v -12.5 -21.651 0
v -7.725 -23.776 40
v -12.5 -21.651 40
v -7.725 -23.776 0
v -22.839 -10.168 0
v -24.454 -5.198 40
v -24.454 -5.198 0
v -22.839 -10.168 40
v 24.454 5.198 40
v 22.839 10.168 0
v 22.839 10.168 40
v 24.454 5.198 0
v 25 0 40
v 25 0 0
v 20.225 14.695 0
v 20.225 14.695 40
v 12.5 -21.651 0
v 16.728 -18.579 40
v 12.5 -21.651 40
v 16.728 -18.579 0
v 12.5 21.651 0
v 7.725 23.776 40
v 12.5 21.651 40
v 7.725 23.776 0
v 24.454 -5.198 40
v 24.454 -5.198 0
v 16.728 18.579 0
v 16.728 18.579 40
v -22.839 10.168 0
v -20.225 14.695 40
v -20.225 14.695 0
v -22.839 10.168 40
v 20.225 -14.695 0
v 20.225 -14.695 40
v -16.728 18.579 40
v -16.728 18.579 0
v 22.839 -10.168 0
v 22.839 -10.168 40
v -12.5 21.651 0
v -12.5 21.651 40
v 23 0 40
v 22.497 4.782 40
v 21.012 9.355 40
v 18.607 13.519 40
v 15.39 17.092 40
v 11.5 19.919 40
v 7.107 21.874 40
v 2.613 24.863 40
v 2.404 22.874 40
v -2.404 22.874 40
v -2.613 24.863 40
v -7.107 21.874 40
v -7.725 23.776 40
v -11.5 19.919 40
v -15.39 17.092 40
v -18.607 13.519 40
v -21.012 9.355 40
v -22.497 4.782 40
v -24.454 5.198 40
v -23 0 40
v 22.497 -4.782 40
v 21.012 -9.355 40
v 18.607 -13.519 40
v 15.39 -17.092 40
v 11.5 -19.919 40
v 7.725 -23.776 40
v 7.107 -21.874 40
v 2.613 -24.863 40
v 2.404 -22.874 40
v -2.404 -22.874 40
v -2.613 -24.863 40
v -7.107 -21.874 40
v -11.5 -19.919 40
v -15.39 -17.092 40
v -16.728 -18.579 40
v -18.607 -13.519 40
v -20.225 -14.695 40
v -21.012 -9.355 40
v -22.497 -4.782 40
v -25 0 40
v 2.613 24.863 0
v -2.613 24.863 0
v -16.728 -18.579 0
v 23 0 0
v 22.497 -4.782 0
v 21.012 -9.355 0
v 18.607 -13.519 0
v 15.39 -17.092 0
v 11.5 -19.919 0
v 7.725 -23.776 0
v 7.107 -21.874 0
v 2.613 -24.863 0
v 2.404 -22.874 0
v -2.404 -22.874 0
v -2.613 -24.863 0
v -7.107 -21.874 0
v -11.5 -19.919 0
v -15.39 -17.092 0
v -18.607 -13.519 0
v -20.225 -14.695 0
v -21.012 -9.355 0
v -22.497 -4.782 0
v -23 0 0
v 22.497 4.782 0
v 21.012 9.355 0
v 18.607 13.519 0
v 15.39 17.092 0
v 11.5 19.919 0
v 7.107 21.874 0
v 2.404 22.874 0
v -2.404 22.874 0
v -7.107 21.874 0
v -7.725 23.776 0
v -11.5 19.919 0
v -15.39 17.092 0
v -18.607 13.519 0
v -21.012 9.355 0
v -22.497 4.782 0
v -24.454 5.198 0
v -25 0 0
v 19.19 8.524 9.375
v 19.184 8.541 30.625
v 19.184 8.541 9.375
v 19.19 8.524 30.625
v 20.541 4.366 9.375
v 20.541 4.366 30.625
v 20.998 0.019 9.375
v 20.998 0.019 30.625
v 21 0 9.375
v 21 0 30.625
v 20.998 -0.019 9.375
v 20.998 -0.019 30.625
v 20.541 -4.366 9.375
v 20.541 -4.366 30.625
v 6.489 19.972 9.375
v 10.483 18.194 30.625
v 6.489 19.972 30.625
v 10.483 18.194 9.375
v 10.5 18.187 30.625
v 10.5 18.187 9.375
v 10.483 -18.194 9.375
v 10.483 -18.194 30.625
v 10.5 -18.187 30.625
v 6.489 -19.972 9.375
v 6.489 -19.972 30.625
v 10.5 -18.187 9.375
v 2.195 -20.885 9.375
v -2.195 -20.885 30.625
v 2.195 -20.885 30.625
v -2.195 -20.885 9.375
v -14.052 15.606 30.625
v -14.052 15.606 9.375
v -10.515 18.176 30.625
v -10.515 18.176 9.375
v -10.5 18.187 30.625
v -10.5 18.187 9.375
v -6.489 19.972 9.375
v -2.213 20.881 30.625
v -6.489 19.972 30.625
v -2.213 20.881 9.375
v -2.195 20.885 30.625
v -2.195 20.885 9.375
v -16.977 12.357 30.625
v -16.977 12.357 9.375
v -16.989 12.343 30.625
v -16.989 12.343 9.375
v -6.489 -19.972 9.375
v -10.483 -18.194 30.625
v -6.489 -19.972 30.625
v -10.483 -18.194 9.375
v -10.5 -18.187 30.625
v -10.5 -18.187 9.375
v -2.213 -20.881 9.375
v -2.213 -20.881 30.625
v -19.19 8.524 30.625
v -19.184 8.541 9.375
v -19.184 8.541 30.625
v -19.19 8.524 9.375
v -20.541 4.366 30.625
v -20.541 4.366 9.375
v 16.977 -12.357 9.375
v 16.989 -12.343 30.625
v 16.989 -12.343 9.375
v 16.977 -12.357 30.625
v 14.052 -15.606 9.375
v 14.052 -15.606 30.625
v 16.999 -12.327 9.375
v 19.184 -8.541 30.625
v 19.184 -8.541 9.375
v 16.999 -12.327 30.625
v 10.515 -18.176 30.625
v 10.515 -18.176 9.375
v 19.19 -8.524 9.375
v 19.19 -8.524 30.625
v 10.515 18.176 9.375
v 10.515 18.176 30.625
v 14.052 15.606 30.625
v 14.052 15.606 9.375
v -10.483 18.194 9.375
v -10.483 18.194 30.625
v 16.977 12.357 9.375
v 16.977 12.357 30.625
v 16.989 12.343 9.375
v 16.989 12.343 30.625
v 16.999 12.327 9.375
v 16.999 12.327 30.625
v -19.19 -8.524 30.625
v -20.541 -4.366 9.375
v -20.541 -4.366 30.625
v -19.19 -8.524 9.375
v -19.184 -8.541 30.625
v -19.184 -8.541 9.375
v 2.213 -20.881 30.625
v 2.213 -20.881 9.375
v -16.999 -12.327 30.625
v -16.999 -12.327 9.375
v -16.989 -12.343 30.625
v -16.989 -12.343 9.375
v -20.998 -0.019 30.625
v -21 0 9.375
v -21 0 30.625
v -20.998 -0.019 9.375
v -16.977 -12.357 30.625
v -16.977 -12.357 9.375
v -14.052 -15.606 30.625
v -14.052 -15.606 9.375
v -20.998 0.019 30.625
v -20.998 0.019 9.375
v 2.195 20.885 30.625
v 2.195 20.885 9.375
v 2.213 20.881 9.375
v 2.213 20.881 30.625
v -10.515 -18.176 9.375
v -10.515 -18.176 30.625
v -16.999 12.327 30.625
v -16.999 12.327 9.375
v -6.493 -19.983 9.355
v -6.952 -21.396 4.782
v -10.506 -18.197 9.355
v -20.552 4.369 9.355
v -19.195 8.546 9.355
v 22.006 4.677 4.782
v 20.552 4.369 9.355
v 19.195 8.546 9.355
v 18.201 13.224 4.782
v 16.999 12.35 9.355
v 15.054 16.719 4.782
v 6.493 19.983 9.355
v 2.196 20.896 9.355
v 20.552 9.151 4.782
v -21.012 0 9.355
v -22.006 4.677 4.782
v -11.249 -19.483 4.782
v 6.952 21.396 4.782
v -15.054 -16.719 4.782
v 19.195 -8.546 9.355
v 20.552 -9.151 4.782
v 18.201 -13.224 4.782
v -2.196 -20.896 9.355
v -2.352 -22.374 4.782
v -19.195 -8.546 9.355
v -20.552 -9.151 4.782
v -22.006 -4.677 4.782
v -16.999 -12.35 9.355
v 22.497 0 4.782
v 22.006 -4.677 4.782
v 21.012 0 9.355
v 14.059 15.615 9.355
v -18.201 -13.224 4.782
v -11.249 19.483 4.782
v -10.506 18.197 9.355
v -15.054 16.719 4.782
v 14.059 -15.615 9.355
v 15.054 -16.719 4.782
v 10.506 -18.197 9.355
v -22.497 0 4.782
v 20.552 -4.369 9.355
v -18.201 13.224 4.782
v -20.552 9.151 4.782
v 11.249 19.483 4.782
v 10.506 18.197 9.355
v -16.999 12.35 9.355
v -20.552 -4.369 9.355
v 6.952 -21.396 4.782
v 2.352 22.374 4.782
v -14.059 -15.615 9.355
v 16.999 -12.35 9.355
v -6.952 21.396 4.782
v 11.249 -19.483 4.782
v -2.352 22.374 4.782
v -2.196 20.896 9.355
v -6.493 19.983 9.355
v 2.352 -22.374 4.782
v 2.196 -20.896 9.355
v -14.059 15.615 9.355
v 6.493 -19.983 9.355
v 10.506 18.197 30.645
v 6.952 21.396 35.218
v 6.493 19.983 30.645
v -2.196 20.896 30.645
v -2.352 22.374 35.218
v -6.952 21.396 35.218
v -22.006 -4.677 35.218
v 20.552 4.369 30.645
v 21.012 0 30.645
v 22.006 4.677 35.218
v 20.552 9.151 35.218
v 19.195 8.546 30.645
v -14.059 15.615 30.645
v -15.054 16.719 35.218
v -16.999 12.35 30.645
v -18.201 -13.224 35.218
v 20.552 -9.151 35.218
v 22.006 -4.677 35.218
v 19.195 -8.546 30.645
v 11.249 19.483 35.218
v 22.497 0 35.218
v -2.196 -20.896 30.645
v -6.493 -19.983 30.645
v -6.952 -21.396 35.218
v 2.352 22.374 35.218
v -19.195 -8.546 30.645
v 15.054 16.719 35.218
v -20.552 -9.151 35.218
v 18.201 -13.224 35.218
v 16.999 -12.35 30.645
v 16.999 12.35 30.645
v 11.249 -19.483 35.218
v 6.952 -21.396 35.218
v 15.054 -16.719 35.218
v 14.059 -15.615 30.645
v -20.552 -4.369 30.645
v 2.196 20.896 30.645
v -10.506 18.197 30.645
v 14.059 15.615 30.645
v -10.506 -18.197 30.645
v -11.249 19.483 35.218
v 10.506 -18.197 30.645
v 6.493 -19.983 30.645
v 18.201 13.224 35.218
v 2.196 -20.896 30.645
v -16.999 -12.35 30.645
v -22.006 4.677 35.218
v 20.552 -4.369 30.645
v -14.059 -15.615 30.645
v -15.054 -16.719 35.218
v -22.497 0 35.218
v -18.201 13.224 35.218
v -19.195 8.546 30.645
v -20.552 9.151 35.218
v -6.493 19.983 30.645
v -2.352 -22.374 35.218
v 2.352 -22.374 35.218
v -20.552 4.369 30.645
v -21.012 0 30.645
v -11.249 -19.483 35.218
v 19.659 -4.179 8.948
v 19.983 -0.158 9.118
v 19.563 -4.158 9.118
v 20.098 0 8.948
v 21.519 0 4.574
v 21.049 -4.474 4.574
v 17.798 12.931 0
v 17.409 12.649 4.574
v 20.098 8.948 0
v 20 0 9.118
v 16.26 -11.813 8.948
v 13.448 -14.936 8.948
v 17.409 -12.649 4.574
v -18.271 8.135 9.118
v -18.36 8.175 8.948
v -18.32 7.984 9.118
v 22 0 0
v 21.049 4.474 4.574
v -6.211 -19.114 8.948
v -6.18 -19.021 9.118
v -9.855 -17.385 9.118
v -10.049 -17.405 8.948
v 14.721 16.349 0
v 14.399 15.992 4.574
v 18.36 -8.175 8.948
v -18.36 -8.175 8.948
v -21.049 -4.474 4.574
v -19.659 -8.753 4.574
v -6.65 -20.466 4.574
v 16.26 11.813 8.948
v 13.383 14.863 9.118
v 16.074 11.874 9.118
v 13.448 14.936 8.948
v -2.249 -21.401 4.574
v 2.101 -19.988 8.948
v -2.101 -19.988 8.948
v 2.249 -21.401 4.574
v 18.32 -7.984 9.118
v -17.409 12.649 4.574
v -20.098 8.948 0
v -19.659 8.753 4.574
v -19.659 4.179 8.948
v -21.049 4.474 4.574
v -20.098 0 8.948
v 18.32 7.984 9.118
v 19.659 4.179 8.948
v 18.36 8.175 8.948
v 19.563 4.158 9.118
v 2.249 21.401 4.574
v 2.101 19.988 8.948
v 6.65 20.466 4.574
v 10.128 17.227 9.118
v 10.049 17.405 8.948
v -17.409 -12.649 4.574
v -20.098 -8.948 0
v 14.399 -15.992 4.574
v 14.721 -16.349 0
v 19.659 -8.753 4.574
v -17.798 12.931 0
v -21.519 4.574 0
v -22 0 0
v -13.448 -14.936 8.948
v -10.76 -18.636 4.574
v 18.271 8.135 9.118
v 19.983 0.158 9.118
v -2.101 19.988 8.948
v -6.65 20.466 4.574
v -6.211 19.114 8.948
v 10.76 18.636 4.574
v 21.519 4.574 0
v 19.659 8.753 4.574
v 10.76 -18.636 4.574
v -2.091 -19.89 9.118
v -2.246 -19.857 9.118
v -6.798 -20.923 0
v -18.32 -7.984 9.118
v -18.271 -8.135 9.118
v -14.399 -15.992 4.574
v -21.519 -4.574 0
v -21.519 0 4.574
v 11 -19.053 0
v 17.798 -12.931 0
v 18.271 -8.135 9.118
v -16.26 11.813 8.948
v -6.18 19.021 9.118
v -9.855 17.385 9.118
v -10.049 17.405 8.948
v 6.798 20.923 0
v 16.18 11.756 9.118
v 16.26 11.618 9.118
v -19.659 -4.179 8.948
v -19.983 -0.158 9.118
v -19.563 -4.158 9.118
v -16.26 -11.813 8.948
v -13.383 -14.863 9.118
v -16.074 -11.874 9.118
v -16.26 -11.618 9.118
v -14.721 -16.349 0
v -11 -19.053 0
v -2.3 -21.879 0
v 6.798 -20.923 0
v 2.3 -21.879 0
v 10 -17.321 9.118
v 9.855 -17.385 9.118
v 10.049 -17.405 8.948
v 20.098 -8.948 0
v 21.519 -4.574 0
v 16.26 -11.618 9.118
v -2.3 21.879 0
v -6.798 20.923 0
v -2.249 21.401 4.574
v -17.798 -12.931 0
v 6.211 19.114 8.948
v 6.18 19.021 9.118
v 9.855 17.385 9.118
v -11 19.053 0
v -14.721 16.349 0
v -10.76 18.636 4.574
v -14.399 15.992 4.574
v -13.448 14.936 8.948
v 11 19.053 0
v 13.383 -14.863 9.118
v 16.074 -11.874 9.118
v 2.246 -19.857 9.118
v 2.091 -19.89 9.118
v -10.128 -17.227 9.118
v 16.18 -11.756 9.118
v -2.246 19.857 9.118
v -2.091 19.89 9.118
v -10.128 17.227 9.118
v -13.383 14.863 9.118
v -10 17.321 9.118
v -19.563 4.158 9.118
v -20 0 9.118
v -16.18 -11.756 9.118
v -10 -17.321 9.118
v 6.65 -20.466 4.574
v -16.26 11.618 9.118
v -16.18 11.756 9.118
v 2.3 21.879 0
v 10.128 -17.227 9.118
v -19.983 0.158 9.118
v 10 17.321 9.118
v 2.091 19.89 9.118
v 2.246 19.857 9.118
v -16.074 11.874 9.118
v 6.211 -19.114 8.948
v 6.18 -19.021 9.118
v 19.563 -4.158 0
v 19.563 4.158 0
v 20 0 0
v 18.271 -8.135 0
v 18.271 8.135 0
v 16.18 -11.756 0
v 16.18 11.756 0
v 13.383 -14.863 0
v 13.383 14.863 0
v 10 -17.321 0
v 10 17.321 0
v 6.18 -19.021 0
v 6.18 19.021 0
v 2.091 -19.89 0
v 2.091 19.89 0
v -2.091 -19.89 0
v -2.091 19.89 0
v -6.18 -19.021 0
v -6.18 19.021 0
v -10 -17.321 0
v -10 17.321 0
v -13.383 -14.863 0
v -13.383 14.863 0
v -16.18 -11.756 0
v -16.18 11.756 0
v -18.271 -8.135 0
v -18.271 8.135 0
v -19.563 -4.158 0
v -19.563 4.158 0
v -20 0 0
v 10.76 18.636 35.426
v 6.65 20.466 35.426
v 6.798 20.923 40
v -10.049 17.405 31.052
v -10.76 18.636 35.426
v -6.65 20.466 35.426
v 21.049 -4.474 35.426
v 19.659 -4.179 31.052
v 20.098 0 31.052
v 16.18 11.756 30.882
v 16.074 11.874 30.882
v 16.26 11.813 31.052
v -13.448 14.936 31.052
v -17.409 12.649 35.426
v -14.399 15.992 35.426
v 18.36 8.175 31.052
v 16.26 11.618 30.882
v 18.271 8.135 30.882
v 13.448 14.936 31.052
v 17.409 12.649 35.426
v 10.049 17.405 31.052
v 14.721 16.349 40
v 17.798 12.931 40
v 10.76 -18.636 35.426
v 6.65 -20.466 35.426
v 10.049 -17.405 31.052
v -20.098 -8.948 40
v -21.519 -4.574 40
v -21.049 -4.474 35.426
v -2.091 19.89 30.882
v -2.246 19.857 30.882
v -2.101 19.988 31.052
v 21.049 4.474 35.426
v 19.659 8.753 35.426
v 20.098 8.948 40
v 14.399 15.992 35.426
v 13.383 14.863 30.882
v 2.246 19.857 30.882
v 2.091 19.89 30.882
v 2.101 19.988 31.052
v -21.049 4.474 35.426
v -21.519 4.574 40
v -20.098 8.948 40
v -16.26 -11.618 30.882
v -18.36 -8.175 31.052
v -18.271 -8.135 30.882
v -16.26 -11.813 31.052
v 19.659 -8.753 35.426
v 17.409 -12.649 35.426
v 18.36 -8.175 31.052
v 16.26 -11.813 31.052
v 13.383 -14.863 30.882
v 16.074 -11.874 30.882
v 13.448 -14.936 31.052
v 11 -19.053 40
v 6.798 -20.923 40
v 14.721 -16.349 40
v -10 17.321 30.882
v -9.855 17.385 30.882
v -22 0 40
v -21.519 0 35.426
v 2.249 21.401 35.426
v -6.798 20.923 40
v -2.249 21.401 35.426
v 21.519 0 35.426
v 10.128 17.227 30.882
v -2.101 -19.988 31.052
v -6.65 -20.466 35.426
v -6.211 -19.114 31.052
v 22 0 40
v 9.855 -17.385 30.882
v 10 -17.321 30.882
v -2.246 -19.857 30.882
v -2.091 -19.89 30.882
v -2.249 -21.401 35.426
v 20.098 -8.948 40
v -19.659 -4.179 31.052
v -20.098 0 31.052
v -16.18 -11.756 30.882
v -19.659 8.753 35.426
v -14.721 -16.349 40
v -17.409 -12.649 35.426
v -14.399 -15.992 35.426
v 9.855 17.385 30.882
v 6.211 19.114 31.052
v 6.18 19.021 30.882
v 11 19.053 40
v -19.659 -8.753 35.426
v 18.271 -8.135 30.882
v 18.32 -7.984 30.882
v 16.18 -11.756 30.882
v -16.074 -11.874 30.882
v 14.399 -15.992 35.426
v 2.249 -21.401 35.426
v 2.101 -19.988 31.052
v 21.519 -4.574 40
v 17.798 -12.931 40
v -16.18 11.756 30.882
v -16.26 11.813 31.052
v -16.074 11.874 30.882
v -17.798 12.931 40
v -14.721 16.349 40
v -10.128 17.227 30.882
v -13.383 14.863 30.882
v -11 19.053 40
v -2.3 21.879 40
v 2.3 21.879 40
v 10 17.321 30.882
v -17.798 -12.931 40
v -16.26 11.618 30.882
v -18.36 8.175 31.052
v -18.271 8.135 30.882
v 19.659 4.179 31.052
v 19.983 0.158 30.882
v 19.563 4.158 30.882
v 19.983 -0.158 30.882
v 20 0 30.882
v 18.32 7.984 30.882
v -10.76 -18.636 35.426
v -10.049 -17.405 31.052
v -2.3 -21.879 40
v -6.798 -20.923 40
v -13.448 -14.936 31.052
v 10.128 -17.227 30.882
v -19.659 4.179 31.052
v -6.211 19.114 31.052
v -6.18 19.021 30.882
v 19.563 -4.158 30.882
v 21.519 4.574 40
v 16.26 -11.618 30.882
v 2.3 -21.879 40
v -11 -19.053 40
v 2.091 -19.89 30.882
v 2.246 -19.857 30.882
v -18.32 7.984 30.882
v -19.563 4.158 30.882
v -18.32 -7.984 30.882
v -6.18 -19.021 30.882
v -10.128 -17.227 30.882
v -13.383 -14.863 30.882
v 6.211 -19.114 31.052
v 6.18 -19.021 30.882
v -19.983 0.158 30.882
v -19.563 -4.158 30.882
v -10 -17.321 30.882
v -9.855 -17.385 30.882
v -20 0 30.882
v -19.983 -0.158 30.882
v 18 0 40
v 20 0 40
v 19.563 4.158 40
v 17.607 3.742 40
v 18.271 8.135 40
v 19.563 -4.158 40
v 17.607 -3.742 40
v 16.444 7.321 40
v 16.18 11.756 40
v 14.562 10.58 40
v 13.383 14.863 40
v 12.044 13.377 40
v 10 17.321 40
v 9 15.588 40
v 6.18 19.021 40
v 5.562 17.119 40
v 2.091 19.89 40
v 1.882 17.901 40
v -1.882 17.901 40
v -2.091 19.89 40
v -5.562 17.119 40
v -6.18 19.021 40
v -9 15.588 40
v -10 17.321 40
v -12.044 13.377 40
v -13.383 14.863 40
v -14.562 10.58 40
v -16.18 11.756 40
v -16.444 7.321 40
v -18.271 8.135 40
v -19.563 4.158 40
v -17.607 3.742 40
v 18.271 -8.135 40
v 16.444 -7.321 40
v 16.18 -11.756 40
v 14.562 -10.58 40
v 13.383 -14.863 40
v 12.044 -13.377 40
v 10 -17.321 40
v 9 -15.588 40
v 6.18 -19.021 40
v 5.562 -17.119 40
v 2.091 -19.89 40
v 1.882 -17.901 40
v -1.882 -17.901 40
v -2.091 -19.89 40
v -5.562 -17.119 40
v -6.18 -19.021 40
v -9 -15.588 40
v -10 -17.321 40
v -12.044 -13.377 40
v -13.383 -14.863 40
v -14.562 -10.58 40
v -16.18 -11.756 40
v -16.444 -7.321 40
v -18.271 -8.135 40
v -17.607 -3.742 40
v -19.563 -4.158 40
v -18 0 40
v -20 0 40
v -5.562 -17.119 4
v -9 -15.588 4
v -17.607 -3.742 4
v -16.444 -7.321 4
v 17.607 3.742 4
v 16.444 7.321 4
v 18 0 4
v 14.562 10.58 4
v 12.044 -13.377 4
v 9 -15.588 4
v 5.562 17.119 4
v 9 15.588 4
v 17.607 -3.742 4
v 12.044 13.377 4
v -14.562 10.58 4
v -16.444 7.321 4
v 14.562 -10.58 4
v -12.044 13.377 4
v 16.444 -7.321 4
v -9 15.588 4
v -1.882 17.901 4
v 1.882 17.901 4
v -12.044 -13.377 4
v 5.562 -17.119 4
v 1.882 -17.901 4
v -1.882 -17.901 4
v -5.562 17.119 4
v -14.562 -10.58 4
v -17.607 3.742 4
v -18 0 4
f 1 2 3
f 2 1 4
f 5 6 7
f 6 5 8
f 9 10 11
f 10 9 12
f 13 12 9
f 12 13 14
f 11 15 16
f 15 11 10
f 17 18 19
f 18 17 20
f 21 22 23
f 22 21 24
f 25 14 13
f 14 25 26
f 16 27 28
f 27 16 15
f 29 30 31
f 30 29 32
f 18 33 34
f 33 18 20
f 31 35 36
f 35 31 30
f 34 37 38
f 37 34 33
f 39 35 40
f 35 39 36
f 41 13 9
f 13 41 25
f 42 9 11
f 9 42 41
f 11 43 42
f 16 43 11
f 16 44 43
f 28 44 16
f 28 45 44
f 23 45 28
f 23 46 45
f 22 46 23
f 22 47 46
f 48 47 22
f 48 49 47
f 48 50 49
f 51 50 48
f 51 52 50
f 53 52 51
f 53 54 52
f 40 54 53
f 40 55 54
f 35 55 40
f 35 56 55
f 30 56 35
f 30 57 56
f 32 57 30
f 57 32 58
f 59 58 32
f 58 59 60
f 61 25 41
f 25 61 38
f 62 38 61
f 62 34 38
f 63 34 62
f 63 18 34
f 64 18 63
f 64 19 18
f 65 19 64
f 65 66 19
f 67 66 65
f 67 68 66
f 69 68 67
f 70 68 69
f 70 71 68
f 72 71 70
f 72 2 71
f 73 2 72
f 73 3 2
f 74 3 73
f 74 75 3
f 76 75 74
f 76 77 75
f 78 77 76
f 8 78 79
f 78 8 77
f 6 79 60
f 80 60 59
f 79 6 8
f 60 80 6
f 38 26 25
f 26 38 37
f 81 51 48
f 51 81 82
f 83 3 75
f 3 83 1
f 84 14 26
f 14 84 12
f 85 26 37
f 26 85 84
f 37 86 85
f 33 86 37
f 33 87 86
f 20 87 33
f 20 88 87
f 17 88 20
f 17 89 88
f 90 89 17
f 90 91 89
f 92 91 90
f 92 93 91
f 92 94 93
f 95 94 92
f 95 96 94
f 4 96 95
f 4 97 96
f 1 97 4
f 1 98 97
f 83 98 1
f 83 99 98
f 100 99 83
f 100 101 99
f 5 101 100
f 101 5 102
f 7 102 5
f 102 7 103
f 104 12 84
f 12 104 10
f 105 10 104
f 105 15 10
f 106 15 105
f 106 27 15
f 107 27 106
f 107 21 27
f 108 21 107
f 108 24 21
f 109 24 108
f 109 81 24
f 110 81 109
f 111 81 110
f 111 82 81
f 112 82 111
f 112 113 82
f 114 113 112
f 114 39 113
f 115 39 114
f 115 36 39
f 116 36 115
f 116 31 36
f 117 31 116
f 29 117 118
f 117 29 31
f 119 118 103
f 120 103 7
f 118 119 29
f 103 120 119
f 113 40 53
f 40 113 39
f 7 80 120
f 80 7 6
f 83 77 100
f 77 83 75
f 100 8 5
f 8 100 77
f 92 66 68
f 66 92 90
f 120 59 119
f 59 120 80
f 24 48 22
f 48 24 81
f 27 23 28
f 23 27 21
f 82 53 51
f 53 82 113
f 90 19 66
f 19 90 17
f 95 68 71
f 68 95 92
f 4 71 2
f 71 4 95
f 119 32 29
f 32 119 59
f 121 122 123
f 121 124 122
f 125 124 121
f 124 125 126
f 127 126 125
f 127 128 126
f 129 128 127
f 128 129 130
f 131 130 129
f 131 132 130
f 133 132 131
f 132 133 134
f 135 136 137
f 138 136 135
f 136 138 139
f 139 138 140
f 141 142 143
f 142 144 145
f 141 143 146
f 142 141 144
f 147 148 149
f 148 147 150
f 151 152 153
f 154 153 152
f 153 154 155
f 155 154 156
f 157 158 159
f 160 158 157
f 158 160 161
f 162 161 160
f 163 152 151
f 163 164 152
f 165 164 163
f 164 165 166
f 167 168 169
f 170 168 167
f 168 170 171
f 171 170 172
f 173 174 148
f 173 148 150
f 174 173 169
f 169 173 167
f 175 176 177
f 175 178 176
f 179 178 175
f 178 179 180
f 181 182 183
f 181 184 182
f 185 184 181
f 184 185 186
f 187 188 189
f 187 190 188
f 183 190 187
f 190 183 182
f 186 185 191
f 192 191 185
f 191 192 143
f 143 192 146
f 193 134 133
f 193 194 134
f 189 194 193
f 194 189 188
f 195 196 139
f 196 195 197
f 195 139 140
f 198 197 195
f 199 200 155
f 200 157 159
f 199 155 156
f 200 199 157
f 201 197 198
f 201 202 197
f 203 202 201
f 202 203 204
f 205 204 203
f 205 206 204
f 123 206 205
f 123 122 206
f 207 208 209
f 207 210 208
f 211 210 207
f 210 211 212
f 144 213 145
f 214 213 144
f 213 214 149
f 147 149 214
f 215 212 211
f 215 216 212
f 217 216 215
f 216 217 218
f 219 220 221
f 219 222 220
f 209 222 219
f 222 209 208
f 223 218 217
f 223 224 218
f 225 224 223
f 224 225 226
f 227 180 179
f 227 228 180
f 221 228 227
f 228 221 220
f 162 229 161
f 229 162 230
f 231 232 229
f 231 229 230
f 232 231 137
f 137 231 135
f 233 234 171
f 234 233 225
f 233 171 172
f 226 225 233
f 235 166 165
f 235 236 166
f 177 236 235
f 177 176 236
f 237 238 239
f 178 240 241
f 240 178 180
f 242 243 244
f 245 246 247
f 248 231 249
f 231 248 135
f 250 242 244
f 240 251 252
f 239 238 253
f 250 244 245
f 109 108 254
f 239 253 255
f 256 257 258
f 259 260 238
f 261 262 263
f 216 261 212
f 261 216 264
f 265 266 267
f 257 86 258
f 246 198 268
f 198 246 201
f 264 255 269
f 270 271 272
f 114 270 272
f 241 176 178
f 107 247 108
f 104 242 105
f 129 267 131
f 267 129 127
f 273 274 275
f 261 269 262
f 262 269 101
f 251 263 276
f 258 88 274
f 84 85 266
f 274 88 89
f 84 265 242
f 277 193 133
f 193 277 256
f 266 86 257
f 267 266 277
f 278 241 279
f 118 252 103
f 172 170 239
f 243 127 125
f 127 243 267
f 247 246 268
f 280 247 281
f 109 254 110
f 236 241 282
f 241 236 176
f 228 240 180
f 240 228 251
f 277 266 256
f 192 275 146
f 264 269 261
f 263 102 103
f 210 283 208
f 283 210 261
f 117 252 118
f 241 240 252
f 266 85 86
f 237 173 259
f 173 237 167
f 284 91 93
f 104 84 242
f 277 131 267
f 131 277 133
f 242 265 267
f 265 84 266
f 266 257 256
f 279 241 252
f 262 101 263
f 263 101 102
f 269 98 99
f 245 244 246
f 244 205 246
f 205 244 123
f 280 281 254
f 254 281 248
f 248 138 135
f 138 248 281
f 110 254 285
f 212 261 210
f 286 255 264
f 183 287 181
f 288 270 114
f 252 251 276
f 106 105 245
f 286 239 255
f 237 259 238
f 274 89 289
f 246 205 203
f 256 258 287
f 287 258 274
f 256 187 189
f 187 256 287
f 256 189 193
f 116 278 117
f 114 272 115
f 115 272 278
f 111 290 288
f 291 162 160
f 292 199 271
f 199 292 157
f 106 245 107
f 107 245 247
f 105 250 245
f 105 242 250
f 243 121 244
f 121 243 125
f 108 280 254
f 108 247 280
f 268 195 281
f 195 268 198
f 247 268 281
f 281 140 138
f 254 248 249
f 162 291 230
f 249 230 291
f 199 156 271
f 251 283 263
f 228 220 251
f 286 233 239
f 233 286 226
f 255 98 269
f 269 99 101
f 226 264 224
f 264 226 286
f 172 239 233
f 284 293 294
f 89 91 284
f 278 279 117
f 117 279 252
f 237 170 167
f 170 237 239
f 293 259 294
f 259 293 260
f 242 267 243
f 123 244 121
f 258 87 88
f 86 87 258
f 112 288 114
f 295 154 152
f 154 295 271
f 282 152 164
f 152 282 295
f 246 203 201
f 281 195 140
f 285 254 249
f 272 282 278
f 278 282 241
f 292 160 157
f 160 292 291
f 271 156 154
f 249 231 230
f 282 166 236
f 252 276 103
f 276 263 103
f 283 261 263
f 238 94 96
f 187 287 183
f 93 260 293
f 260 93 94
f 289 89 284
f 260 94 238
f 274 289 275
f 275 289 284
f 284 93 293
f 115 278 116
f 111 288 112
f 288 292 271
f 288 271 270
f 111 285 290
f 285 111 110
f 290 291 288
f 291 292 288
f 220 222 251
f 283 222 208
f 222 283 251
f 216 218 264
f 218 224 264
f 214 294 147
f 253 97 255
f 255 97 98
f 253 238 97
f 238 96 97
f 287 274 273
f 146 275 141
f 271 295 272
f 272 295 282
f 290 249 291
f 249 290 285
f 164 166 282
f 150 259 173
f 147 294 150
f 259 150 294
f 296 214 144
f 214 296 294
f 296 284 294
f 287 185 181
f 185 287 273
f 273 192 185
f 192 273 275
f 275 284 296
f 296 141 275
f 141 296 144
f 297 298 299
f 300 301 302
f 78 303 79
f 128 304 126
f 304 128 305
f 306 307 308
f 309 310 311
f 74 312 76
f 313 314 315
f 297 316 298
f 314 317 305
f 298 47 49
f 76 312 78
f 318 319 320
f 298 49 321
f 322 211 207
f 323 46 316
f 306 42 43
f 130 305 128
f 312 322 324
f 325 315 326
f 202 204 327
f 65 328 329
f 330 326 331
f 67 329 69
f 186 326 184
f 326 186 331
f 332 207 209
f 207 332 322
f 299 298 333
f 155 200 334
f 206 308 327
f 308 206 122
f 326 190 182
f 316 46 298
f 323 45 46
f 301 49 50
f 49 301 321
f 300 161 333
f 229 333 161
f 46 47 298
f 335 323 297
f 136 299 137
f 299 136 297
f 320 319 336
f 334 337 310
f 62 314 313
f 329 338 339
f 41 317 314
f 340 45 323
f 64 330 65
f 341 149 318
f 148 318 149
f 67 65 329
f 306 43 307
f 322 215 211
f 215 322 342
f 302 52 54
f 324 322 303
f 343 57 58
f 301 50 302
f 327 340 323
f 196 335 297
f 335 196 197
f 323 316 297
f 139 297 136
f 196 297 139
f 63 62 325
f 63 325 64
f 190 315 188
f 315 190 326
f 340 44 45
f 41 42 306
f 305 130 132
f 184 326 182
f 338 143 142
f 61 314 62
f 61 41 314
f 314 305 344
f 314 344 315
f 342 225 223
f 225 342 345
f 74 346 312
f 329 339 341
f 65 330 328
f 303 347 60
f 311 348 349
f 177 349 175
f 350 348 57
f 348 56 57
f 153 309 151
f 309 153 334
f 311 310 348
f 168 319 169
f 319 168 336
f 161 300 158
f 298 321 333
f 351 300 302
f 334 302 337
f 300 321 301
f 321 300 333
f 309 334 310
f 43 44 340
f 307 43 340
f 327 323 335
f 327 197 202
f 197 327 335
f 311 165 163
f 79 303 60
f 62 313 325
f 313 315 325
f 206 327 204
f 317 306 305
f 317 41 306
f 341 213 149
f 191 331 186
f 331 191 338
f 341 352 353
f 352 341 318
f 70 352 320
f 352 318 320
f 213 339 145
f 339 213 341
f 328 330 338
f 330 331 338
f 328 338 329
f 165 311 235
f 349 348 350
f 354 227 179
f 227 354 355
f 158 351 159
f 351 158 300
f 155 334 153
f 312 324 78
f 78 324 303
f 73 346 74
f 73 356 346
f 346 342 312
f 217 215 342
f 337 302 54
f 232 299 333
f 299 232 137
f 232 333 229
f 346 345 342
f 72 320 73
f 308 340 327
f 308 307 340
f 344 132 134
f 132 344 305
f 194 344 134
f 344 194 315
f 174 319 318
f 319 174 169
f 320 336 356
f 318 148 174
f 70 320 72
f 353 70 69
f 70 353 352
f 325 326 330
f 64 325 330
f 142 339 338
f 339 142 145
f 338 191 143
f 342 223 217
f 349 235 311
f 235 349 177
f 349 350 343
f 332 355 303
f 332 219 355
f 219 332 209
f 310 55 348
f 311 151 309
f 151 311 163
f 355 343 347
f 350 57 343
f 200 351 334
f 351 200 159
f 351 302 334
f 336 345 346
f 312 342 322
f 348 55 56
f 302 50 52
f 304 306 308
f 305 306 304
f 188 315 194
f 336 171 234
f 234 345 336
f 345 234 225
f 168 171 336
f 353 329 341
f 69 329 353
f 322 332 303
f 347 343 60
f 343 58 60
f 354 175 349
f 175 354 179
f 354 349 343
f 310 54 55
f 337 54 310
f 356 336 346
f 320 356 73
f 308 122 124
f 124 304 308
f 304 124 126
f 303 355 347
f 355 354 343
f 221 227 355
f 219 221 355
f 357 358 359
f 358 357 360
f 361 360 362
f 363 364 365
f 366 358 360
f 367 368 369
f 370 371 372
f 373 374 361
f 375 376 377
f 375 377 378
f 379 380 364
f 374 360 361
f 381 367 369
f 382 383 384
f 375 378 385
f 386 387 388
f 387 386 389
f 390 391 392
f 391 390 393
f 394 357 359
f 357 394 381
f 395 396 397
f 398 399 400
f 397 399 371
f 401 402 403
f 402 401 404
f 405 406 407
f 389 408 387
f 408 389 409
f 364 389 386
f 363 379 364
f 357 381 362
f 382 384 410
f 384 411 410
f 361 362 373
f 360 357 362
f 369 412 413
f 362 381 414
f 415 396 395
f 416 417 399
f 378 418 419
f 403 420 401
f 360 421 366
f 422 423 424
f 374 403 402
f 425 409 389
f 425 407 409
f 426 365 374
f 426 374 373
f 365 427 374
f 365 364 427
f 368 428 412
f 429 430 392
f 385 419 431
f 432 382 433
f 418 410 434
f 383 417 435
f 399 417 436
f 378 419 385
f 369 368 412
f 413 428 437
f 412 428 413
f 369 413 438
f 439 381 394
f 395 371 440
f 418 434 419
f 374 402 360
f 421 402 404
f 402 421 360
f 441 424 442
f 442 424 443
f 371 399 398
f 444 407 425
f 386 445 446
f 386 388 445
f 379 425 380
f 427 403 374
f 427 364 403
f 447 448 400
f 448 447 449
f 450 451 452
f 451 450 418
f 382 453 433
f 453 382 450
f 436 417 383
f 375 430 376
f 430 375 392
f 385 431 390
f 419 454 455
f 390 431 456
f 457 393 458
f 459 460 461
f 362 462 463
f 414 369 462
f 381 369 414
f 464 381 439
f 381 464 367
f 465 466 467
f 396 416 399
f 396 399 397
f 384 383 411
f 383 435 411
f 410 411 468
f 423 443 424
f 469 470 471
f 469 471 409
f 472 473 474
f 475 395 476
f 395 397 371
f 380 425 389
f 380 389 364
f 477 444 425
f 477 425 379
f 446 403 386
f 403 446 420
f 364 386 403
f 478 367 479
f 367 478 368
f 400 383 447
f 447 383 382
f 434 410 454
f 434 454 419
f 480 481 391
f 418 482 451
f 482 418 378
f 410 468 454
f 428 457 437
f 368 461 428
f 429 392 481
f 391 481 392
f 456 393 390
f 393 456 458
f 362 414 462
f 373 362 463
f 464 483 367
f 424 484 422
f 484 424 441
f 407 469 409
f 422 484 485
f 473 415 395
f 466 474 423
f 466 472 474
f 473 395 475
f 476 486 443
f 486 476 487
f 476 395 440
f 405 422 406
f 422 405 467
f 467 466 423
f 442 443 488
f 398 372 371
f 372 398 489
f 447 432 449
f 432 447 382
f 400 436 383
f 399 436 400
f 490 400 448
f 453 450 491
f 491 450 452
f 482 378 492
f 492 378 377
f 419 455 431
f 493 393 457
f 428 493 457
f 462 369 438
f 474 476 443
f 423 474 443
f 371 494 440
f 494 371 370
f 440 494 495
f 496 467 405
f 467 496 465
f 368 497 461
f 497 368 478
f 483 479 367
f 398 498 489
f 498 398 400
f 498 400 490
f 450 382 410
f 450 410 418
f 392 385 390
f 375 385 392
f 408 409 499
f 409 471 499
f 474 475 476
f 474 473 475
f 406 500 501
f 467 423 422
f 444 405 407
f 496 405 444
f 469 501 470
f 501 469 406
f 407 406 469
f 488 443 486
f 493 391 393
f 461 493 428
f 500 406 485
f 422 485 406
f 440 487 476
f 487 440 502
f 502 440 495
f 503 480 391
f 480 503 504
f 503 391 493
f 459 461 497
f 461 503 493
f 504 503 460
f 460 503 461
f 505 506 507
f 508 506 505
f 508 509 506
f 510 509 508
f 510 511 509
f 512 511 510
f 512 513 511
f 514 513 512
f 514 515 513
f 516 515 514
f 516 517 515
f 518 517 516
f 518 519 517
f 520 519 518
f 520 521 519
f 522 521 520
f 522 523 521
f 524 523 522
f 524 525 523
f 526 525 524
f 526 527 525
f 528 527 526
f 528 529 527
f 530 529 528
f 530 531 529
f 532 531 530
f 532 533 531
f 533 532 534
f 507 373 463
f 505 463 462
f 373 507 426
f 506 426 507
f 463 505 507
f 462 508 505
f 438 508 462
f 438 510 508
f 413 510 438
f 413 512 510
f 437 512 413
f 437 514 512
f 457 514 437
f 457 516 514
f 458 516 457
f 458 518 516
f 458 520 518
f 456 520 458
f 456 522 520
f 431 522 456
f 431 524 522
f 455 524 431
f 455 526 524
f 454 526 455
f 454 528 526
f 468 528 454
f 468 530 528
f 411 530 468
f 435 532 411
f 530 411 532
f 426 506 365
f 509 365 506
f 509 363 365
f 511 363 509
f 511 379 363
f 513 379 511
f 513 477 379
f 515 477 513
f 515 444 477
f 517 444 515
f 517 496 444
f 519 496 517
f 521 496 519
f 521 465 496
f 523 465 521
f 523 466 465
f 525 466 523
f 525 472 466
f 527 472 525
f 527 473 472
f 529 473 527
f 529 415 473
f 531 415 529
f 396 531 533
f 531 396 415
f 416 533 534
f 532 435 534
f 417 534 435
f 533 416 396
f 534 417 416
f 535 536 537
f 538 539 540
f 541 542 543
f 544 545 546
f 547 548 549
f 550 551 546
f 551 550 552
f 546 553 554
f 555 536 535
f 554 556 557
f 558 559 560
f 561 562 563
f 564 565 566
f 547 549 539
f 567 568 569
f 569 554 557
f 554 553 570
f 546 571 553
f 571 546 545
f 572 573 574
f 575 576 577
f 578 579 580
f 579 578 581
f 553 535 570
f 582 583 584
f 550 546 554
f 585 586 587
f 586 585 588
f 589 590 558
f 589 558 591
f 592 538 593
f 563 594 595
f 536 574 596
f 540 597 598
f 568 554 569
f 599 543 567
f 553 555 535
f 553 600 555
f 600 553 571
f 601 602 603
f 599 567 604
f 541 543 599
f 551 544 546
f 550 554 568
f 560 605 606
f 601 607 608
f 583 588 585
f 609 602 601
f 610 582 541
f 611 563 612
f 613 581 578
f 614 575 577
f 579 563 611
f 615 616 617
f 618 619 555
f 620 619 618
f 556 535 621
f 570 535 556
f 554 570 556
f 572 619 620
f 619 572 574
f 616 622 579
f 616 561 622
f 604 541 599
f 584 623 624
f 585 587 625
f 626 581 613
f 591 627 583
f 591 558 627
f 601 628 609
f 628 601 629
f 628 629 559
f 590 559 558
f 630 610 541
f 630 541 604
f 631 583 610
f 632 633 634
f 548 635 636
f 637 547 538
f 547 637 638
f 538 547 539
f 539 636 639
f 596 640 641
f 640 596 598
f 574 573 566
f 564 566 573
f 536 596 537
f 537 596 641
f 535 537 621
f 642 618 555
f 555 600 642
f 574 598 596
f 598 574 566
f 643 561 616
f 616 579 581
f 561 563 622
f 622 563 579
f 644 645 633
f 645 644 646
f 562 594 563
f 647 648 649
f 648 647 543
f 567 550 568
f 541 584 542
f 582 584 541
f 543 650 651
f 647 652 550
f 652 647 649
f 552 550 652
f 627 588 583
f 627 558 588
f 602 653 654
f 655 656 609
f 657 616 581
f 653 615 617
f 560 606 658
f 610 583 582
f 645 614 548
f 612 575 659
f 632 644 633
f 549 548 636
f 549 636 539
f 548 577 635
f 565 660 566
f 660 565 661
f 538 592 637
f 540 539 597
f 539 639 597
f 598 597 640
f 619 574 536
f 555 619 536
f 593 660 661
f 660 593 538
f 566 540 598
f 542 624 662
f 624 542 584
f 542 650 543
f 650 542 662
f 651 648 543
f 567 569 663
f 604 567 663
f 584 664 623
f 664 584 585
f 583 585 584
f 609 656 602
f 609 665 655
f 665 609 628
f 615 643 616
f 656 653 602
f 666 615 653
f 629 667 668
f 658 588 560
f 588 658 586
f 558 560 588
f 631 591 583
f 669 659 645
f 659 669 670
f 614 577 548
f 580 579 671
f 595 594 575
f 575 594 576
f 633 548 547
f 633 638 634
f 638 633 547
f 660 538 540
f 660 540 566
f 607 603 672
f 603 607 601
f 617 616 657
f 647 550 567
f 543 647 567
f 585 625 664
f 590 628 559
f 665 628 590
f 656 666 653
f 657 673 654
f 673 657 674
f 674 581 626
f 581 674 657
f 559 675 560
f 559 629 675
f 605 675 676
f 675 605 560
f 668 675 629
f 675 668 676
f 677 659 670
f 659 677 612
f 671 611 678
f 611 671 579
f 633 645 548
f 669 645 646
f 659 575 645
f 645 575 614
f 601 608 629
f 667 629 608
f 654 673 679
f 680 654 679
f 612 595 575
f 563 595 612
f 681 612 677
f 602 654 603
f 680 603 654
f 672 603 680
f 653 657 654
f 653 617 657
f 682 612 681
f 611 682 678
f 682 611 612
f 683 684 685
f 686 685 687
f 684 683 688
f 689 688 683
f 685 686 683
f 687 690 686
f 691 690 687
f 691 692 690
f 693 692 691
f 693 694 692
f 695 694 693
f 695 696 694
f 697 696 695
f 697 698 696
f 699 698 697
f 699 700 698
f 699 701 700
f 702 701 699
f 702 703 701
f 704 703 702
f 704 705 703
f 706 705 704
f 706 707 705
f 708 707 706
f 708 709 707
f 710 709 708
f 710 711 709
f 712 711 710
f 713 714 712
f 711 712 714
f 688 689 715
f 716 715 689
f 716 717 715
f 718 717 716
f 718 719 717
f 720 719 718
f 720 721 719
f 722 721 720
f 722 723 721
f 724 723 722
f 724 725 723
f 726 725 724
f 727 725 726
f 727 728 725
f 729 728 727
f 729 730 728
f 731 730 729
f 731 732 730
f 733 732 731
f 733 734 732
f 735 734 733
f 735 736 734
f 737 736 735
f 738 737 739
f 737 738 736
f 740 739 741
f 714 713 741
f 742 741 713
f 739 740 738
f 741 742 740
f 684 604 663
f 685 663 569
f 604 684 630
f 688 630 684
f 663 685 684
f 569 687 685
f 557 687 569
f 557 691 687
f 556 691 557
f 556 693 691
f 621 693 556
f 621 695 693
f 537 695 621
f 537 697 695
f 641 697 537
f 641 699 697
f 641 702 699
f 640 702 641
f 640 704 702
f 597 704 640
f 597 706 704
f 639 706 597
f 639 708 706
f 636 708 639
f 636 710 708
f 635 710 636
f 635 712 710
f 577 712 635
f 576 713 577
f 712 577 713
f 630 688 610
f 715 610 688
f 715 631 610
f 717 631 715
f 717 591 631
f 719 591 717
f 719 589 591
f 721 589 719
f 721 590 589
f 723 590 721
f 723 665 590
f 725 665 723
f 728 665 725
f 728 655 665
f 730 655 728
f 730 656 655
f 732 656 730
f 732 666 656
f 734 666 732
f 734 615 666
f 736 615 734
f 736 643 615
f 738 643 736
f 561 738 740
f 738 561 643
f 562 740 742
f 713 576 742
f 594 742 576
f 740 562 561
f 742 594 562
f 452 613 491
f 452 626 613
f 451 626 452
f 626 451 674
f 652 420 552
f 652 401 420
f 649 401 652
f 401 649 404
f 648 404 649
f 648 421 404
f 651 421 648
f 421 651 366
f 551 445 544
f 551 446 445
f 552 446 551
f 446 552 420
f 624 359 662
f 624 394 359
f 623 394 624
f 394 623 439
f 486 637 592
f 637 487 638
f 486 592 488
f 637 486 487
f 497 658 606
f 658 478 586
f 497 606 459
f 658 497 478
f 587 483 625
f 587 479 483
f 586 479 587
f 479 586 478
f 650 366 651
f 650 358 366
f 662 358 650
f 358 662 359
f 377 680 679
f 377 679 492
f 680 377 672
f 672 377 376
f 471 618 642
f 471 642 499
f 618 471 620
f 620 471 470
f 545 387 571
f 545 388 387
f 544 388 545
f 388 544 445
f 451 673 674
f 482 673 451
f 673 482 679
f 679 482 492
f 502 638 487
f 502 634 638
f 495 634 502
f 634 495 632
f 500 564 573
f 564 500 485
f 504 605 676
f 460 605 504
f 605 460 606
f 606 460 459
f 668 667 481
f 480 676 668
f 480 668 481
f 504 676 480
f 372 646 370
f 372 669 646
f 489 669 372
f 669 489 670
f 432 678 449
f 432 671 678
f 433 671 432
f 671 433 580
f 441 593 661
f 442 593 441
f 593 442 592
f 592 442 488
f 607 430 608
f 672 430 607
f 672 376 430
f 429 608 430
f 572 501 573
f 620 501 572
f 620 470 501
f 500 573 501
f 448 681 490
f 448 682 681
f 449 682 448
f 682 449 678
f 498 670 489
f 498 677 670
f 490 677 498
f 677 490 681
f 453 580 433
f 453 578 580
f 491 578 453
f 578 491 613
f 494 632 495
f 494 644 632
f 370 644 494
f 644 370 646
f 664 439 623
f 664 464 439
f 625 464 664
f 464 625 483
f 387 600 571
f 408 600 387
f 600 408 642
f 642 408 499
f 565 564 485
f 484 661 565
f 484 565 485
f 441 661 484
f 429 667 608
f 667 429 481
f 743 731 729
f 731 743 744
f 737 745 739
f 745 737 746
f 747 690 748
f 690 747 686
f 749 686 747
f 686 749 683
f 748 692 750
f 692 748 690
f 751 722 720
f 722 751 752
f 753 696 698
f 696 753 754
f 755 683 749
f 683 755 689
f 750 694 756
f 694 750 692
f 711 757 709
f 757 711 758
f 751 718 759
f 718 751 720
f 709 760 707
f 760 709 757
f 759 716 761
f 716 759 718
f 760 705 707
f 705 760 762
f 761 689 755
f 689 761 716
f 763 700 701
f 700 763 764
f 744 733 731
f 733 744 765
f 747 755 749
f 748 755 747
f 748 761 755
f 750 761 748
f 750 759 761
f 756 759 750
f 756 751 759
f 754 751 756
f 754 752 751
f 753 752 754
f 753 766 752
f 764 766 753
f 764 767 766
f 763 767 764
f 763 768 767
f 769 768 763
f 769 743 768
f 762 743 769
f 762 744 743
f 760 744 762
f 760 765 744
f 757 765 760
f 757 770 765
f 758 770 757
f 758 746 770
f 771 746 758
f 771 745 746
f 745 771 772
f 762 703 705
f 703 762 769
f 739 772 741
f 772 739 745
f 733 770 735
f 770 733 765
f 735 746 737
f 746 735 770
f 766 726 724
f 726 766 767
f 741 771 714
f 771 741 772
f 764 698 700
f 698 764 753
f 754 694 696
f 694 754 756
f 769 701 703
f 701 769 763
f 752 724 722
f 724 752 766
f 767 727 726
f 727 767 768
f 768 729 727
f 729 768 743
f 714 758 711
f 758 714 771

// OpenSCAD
bodyHeight=40;
bodyWidth=50;
grabHeight=40;
grabWidth=40;
grabLocker=44;
grabOffset=4;

module body(){
    offset = 2;
    difference(){
        cylinder(h=bodyHeight,d=bodyWidth);
        cylinder(h=grabHeight,d=grabWidth+offset);
        sphere(d=grabLocker+offset);
        translate([0,0,bodyHeight]) sphere(d=grabLocker+offset);
    }
}

module grab(){
    difference(){
        union(){
            cylinder(h=grabHeight,d=grabWidth);
            halfSphere(grabLocker,1);
            translate([0,0,bodyHeight]) halfSphere(grabLocker,-1);
        }
        translate([0,0,grabOffset]) cylinder(h=grabHeight,d=grabWidth-grabOffset);
    }
}

module halfSphere(d, dir){
    difference(){
        sphere(d=d);
        translate([0,0,(d/2)*-dir]) cube(d,center=true);
    }
}

body();
grab();
